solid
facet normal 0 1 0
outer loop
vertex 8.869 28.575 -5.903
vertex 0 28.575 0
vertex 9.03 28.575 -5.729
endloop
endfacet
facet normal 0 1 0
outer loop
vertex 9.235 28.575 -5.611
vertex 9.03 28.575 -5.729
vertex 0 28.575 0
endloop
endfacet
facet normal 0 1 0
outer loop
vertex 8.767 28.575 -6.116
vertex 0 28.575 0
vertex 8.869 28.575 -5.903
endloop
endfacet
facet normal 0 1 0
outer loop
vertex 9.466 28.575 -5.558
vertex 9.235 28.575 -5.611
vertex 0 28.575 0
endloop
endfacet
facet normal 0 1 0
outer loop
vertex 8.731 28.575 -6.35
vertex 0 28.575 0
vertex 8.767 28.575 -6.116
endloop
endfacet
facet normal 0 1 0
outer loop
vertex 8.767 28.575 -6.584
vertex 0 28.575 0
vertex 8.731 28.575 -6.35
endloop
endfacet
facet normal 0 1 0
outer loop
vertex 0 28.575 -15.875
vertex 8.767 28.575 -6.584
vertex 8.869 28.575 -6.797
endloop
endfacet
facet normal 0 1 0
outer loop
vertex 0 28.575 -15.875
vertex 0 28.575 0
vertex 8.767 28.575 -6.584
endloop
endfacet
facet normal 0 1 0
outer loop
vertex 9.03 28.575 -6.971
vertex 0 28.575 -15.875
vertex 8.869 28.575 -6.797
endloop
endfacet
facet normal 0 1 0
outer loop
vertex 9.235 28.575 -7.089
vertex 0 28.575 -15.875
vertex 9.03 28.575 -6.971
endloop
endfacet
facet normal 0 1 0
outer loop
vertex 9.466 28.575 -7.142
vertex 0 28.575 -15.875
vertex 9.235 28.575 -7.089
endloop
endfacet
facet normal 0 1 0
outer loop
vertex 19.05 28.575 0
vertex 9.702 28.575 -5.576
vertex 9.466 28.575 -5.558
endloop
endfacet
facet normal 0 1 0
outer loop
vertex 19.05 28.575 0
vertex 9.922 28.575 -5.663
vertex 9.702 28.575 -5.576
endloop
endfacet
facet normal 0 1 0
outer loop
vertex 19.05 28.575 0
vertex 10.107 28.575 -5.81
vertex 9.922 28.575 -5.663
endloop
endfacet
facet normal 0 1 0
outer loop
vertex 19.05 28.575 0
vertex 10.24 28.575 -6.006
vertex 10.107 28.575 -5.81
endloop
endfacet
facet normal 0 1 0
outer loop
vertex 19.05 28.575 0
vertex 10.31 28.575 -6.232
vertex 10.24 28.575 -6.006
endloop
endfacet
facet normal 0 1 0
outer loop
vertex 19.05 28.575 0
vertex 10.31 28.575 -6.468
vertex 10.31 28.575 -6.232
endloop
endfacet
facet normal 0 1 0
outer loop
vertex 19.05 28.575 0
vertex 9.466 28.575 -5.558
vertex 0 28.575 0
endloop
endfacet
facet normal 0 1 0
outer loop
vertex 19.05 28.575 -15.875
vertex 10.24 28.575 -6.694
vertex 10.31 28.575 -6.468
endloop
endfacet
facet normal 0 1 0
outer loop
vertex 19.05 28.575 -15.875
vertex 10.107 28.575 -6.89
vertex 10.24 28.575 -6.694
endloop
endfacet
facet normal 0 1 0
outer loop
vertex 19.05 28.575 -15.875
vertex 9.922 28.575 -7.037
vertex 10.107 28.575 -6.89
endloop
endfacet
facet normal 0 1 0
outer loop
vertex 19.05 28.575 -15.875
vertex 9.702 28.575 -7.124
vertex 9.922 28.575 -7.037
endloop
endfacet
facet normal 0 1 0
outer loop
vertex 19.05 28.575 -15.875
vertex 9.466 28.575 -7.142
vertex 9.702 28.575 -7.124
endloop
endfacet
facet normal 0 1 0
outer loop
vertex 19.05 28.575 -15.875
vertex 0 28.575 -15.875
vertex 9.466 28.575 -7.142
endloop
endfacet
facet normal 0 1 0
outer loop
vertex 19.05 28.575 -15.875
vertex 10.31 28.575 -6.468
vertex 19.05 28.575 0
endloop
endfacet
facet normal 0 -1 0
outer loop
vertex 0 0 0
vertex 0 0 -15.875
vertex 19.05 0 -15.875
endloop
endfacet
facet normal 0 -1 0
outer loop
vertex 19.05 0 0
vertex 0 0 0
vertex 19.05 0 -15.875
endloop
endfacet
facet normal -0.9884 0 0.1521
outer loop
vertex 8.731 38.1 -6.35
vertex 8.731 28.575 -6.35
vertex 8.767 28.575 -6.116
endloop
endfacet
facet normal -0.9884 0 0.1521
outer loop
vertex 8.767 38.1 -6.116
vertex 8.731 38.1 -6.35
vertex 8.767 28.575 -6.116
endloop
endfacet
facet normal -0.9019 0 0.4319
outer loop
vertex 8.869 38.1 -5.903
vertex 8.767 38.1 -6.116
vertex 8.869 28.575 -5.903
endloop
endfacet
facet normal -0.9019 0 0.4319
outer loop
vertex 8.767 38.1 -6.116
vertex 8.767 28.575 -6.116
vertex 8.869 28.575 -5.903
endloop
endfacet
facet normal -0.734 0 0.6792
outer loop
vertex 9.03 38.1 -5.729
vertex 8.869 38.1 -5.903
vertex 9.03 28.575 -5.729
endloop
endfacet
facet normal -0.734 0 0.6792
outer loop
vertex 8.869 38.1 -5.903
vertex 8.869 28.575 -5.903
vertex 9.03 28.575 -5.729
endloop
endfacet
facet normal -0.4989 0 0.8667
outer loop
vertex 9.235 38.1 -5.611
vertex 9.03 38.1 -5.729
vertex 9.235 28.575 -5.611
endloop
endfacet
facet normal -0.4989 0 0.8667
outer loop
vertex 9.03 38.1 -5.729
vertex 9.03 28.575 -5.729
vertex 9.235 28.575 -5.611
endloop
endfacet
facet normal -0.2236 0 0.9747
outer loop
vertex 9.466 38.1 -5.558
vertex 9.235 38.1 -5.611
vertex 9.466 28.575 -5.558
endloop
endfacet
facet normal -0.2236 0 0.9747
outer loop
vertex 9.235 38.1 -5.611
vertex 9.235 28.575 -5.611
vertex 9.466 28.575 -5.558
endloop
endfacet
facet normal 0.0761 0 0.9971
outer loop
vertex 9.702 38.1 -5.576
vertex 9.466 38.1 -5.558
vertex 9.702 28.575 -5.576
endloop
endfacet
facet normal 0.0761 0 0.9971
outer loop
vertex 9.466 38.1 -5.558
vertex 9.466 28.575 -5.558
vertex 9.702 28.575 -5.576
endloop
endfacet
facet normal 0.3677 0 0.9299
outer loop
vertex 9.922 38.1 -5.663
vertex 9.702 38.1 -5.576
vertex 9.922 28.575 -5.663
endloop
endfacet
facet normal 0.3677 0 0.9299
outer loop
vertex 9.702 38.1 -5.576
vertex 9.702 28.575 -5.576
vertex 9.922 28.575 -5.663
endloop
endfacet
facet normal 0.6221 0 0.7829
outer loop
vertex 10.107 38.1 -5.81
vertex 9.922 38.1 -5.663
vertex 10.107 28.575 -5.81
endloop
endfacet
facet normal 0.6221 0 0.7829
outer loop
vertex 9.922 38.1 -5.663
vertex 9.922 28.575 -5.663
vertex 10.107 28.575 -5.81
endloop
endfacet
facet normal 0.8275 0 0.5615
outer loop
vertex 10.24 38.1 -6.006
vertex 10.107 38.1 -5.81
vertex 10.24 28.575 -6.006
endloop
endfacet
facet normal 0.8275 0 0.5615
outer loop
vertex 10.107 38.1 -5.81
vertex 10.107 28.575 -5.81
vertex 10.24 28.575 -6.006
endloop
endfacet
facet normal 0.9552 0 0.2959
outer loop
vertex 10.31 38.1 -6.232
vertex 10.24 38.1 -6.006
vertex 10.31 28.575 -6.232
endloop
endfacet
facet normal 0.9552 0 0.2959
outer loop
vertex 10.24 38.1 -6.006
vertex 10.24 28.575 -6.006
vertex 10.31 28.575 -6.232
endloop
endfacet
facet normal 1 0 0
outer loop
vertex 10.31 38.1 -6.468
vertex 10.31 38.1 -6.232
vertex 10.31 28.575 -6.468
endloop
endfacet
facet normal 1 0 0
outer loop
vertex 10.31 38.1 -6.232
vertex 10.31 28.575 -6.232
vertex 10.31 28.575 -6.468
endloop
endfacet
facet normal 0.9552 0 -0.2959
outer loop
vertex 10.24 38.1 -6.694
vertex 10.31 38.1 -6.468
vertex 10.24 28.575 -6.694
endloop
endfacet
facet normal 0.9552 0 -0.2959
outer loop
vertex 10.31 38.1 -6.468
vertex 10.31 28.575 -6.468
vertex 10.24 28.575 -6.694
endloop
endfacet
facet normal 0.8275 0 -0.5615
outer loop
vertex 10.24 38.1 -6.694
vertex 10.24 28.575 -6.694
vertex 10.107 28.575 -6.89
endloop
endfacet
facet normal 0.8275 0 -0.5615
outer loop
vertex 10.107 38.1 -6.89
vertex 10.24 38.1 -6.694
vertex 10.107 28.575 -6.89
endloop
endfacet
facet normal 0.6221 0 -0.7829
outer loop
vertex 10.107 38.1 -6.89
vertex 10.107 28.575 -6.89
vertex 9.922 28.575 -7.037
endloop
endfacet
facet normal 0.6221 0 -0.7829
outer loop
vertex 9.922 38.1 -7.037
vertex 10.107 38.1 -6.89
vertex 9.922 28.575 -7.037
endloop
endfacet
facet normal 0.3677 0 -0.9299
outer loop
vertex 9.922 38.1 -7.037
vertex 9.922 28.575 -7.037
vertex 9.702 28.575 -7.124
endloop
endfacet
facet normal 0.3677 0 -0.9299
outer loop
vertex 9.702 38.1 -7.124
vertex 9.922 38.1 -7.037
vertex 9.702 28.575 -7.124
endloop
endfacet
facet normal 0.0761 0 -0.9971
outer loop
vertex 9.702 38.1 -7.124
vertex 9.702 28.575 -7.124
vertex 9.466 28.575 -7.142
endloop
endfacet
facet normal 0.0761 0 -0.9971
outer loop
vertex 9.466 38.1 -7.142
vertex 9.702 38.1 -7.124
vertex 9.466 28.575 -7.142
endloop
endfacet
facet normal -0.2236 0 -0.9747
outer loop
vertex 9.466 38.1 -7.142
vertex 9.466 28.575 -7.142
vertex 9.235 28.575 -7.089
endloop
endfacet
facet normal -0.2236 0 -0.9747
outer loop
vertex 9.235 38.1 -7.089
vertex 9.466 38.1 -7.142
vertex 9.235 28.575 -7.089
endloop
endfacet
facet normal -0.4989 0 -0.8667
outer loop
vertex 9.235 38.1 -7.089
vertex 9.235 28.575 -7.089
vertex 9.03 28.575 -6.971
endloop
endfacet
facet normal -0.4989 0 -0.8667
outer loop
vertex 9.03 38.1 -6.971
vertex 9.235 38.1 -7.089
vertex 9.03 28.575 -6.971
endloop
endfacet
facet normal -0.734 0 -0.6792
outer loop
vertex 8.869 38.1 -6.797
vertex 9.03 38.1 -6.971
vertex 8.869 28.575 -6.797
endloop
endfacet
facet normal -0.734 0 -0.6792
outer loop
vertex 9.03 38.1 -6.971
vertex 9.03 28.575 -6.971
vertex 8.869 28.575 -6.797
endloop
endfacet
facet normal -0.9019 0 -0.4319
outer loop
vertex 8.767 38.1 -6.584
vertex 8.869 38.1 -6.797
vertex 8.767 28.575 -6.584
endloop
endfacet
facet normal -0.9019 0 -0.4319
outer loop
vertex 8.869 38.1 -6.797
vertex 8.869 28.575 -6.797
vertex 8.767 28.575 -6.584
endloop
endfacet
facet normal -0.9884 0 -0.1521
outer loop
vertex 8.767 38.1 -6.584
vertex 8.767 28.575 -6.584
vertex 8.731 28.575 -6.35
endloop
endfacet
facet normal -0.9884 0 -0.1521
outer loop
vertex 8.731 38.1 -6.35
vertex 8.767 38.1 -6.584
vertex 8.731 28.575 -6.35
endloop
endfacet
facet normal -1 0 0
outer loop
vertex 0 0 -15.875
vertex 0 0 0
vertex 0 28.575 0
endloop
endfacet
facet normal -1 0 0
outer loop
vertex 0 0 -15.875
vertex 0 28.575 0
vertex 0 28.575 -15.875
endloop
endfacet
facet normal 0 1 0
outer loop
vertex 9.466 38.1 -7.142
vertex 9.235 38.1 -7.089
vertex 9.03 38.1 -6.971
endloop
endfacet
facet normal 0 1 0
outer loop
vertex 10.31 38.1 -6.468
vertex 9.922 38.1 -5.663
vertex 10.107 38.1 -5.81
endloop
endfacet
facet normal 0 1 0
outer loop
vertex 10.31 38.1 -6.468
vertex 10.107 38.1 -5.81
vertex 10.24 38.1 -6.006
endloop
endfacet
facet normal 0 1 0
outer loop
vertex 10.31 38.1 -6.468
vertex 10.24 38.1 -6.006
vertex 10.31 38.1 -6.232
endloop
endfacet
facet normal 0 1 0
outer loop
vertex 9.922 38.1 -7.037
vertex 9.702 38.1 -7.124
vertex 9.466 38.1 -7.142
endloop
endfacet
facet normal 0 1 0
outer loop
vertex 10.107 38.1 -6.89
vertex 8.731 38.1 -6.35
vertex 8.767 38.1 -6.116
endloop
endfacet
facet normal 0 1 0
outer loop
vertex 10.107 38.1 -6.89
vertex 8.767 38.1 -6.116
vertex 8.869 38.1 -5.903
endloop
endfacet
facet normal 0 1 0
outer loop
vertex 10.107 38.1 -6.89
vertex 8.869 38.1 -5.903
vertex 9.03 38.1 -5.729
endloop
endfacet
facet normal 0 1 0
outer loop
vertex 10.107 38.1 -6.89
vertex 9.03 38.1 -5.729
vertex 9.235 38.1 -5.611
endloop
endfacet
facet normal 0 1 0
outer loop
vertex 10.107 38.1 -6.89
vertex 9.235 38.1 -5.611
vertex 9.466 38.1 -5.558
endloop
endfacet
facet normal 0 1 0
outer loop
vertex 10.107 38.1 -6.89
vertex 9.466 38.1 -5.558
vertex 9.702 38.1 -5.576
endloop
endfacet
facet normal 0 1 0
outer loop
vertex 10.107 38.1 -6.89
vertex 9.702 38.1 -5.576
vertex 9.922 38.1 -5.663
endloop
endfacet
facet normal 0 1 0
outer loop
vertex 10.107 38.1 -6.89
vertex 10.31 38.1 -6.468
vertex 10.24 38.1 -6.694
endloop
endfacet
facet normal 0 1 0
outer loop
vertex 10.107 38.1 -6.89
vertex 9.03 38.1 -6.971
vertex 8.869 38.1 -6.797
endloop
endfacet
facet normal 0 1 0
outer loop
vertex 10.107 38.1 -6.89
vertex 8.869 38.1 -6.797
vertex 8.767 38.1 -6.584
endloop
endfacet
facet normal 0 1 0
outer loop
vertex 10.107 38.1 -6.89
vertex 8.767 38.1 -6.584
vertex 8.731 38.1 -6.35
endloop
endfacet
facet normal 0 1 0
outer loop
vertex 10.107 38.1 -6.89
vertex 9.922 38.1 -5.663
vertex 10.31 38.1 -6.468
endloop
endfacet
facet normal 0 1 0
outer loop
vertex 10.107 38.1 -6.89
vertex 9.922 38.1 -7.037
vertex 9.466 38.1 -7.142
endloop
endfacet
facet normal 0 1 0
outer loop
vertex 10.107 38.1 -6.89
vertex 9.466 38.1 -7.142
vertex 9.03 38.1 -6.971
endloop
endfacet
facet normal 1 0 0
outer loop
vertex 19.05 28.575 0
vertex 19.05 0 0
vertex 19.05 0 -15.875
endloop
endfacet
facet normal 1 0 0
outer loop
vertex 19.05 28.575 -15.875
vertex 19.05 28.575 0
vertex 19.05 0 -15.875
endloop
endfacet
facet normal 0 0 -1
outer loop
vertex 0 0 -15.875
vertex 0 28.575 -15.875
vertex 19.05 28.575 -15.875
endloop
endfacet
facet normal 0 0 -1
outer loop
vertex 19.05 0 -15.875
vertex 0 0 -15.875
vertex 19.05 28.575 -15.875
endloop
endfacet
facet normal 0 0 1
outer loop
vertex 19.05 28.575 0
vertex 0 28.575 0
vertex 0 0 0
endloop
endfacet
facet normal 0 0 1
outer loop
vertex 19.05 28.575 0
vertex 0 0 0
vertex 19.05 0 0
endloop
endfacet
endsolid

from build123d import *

# Parameters (mm, degrees)
SKETCH1_W           = 19.05
SKETCH1_H           = 15.875
BOSS_EXTRUDE1_DEPTH = 28.575
BOSS_EXTRUDE2_DEPTH = 9.525


with BuildPart() as part:
    # Sketch1 → Boss-Extrude1 (new body)
    with BuildSketch(Plane(origin=(0, 0, 0), x_dir=(1, 0, 0), z_dir=(0, 1, 0))):
        with Locations((9.525, 7.9375)):
            Rectangle(SKETCH1_W, SKETCH1_H)
    extrude(amount=BOSS_EXTRUDE1_DEPTH)

    # Sketch2 → Boss-Extrude2 (add)
    with BuildSketch(Plane(origin=(0, 28.575, 0), x_dir=(1, 0, 0), z_dir=(0, 1, 0))):
        with BuildLine():
            ThreePointArc((10.31875, 6.35), (9.525, 7.14375), (8.73125, 6.35))
            Line((8.73125, 6.35), (10.31875, 6.35))
        make_face()
        with BuildLine():
            Line((10.31875, 6.35), (8.73125, 6.35))
            ThreePointArc((8.73125, 6.35), (9.525, 5.55625), (10.31875, 6.35))
        make_face()
    extrude(amount=BOSS_EXTRUDE2_DEPTH)


solid = part.part
